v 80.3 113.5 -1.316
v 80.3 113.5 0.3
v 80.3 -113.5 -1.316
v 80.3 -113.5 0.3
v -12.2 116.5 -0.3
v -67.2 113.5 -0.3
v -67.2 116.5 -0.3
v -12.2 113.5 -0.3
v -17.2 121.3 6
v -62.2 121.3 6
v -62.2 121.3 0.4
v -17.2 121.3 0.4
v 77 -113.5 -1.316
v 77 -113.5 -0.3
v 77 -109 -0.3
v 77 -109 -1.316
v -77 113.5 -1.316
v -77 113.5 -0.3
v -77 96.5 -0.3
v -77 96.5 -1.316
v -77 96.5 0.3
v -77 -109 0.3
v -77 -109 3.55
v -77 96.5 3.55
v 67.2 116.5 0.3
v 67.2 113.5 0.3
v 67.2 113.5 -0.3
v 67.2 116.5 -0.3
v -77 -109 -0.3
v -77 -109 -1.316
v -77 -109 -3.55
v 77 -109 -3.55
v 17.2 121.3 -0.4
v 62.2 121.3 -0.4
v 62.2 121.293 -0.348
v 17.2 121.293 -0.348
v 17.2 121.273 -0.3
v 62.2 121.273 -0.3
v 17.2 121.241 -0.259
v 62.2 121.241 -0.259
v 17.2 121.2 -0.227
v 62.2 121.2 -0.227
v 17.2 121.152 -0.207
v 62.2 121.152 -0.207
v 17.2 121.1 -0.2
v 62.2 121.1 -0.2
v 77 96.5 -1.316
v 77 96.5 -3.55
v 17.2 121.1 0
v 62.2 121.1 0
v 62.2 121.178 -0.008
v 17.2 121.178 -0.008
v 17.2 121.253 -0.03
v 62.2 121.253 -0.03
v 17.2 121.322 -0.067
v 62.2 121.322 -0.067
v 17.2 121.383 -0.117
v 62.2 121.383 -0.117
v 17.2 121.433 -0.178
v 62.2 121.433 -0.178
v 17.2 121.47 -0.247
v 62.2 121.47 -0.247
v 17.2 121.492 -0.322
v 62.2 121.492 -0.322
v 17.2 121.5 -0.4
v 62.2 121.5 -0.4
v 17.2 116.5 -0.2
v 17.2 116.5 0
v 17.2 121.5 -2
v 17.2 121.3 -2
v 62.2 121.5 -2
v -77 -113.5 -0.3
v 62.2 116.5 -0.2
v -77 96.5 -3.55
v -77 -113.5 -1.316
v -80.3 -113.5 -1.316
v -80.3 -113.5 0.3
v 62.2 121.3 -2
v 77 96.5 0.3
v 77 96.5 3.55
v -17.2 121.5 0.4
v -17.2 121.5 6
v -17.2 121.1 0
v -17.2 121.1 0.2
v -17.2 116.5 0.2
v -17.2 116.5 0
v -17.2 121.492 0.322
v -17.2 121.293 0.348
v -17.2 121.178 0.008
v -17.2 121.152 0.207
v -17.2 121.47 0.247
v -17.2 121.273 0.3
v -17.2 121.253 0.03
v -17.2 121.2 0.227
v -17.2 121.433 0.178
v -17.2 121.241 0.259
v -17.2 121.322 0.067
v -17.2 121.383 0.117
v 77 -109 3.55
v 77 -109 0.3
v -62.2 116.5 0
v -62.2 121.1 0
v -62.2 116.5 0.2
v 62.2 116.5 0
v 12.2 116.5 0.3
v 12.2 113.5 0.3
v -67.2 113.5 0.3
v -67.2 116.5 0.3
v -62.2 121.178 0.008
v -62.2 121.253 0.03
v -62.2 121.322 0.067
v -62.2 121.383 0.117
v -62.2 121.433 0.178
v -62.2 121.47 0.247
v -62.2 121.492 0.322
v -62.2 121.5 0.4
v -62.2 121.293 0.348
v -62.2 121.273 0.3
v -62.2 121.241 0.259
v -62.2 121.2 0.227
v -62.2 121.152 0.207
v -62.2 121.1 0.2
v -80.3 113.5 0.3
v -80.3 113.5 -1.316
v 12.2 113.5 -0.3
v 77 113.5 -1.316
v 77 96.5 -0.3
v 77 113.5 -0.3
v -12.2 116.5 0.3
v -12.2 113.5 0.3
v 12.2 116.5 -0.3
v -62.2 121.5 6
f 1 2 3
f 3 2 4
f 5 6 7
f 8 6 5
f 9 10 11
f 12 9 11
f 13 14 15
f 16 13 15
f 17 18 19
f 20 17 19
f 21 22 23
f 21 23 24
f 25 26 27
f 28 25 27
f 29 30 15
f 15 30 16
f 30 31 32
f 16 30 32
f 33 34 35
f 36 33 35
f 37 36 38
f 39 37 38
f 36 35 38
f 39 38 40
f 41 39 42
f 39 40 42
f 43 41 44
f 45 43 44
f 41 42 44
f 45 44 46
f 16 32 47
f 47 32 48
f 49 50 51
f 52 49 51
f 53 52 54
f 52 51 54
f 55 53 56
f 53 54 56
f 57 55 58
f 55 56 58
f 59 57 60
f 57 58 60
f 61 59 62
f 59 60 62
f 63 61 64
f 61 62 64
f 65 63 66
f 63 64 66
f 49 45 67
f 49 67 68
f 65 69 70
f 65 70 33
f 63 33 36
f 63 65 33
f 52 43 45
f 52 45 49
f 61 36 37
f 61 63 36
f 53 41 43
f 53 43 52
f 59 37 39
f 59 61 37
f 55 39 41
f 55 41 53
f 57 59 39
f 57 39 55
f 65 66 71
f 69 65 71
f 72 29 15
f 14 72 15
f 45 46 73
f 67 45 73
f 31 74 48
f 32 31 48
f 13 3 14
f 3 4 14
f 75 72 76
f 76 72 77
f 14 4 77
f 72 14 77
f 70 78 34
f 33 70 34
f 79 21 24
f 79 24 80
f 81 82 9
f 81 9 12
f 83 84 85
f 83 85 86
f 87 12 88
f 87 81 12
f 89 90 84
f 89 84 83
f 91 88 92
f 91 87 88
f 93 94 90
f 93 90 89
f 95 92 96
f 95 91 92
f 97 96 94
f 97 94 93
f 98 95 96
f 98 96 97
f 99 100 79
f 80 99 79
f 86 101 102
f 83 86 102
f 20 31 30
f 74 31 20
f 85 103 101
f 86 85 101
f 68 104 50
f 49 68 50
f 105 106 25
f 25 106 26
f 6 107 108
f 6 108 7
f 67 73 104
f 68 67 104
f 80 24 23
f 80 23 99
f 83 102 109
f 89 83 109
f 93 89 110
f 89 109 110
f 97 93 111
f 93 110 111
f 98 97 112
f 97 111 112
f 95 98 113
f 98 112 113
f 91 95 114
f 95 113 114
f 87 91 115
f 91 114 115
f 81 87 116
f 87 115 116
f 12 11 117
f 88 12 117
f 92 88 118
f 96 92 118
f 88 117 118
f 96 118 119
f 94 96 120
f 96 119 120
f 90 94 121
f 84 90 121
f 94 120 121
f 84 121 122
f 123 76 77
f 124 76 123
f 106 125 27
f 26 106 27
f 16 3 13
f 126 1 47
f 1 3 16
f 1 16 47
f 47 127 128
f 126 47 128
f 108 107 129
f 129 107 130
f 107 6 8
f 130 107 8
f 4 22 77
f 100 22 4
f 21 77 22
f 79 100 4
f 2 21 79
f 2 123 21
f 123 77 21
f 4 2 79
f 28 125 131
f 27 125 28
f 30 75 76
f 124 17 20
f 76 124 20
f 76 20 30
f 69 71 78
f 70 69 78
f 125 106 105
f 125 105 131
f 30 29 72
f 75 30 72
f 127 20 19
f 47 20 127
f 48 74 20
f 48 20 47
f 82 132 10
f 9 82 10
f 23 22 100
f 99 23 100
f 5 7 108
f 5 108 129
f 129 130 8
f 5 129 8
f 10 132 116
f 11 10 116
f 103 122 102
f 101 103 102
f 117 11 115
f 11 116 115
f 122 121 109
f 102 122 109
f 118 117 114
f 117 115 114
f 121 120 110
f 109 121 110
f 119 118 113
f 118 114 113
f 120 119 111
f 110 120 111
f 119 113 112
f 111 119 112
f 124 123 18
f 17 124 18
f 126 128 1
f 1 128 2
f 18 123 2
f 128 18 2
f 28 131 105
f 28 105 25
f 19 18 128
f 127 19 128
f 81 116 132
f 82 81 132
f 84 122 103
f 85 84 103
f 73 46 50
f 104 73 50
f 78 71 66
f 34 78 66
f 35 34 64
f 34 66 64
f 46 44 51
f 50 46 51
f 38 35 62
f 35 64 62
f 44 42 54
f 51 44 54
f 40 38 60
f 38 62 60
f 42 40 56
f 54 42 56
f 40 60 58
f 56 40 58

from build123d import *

# Parameters (mm, degrees)
INSULATION_DEPTH      = 0.3
INSULATION_DEPTH_BACK = 0.3
SKETCH1_W             = 160.6
SKETCH1_H             = 227
MAIN_BODY_DEPTH       = 3.55
MAIN_BODY_DEPTH_BACK  = 3.55
SKETCH2_W             = 154
SKETCH2_H             = 205.5
SIDE_FOLDS_DEPTH      = 1.016
SKETCH114_W           = 55
SKETCH114_H           = 0.6
BOSS_EXTRUDE1_DEPTH   = 3
BOSS_EXTRUDE1_2_DEPTH = 3
BASE_FLANGE1_DEPTH    = 45
BASE_FLANGE2_DEPTH    = 45


# Sheet-metal steps are written as plain solids
with BuildPart() as part:
    # Sketch1 → Insulation (new, two sides: drawn at the far end of the back side and taken through both)
    with BuildSketch(Plane.XY.offset(-INSULATION_DEPTH_BACK)):
        Rectangle(SKETCH1_W, SKETCH1_H)
    extrude(amount=INSULATION_DEPTH + INSULATION_DEPTH_BACK)

    # Sketch2 → Main Body (add, two sides: drawn at the far end of the back side and taken through both)
    with BuildSketch(Plane.XY.offset(-MAIN_BODY_DEPTH_BACK)):
        with Locations((0, -6.25)):
            Rectangle(SKETCH2_W, SKETCH2_H)
    extrude(amount=MAIN_BODY_DEPTH + MAIN_BODY_DEPTH_BACK)

    # Sketch5 → Side Folds (add)
    with BuildSketch(Plane(origin=(0, 0, -0.3), x_dir=(-1, 0, 0), z_dir=(0, 0, -1))):
        Polygon((-77, -109), (-77, 96.5), (-77, 113.5), (-80.3, 113.5), (-80.3, -113.5), (-77, -113.5), align=None)
        Polygon((77, 113.5), (77, 96.5), (77, -109), (77, -113.5), (80.3, -113.5), (80.3, 113.5), align=None)
    extrude(amount=SIDE_FOLDS_DEPTH)


with BuildPart() as body_2:
    # Sketch114 → Boss-Extrude1 (new body)
    with BuildSketch(Plane(origin=(0, 113.5, 0), x_dir=(1, 0, 0), z_dir=(0, 1, 0))):
        with Locations((-39.7, 0)):
            Rectangle(SKETCH114_W, SKETCH114_H)
    extrude(amount=BOSS_EXTRUDE1_DEPTH)


with BuildPart() as body_3:
    # Sketch114 → Boss-Extrude1 2 (new body)
    with BuildSketch(Plane(origin=(0, 113.5, 0), x_dir=(1, 0, 0), z_dir=(0, 1, 0))):
        with Locations((39.7, 0)):
            Rectangle(SKETCH114_W, SKETCH114_H)
    extrude(amount=BOSS_EXTRUDE1_2_DEPTH)


with BuildPart() as body_4:
    # Sketch115 → Base-Flange1 (new body)
    with BuildSketch(Plane.ZY.offset(62.2)):
        with BuildLine():
            Line((0, 116.5), (0, 121.1))
            ThreePointArc((0, 121.1), (0.117157288, 121.382842712), (0.4, 121.5))
            Line((0.4, 121.5), (6, 121.5))
            Line((6, 121.5), (6, 121.3))
            Line((6, 121.3), (0.4, 121.3))
            ThreePointArc((0.4, 121.3), (0.258578644, 121.241421356), (0.2, 121.1))
            Line((0.2, 121.1), (0.2, 116.5))
            Line((0.2, 116.5), (0, 116.5))
        make_face()
    extrude(amount=-BASE_FLANGE1_DEPTH)


with BuildPart() as body_5:
    # Sketch120 → Base-Flange2 (new body)
    with BuildSketch(Plane(origin=(62.2, 0, 0), x_dir=(0, 0, -1), z_dir=(1, 0, 0))):
        with BuildLine():
            Line((0, 116.5), (0, 121.1))
            ThreePointArc((0, 121.1), (0.117157288, 121.382842712), (0.4, 121.5))
            Line((0.4, 121.5), (2, 121.5))
            Line((2, 121.5), (2, 121.3))
            Line((2, 121.3), (0.4, 121.3))
            ThreePointArc((0.4, 121.3), (0.258578644, 121.241421356), (0.2, 121.1))
            Line((0.2, 121.1), (0.2, 116.5))
            Line((0.2, 116.5), (0, 116.5))
        make_face()
    extrude(amount=-BASE_FLANGE2_DEPTH)


solid = Compound([part.part, body_2.part, body_3.part, body_4.part, body_5.part])
